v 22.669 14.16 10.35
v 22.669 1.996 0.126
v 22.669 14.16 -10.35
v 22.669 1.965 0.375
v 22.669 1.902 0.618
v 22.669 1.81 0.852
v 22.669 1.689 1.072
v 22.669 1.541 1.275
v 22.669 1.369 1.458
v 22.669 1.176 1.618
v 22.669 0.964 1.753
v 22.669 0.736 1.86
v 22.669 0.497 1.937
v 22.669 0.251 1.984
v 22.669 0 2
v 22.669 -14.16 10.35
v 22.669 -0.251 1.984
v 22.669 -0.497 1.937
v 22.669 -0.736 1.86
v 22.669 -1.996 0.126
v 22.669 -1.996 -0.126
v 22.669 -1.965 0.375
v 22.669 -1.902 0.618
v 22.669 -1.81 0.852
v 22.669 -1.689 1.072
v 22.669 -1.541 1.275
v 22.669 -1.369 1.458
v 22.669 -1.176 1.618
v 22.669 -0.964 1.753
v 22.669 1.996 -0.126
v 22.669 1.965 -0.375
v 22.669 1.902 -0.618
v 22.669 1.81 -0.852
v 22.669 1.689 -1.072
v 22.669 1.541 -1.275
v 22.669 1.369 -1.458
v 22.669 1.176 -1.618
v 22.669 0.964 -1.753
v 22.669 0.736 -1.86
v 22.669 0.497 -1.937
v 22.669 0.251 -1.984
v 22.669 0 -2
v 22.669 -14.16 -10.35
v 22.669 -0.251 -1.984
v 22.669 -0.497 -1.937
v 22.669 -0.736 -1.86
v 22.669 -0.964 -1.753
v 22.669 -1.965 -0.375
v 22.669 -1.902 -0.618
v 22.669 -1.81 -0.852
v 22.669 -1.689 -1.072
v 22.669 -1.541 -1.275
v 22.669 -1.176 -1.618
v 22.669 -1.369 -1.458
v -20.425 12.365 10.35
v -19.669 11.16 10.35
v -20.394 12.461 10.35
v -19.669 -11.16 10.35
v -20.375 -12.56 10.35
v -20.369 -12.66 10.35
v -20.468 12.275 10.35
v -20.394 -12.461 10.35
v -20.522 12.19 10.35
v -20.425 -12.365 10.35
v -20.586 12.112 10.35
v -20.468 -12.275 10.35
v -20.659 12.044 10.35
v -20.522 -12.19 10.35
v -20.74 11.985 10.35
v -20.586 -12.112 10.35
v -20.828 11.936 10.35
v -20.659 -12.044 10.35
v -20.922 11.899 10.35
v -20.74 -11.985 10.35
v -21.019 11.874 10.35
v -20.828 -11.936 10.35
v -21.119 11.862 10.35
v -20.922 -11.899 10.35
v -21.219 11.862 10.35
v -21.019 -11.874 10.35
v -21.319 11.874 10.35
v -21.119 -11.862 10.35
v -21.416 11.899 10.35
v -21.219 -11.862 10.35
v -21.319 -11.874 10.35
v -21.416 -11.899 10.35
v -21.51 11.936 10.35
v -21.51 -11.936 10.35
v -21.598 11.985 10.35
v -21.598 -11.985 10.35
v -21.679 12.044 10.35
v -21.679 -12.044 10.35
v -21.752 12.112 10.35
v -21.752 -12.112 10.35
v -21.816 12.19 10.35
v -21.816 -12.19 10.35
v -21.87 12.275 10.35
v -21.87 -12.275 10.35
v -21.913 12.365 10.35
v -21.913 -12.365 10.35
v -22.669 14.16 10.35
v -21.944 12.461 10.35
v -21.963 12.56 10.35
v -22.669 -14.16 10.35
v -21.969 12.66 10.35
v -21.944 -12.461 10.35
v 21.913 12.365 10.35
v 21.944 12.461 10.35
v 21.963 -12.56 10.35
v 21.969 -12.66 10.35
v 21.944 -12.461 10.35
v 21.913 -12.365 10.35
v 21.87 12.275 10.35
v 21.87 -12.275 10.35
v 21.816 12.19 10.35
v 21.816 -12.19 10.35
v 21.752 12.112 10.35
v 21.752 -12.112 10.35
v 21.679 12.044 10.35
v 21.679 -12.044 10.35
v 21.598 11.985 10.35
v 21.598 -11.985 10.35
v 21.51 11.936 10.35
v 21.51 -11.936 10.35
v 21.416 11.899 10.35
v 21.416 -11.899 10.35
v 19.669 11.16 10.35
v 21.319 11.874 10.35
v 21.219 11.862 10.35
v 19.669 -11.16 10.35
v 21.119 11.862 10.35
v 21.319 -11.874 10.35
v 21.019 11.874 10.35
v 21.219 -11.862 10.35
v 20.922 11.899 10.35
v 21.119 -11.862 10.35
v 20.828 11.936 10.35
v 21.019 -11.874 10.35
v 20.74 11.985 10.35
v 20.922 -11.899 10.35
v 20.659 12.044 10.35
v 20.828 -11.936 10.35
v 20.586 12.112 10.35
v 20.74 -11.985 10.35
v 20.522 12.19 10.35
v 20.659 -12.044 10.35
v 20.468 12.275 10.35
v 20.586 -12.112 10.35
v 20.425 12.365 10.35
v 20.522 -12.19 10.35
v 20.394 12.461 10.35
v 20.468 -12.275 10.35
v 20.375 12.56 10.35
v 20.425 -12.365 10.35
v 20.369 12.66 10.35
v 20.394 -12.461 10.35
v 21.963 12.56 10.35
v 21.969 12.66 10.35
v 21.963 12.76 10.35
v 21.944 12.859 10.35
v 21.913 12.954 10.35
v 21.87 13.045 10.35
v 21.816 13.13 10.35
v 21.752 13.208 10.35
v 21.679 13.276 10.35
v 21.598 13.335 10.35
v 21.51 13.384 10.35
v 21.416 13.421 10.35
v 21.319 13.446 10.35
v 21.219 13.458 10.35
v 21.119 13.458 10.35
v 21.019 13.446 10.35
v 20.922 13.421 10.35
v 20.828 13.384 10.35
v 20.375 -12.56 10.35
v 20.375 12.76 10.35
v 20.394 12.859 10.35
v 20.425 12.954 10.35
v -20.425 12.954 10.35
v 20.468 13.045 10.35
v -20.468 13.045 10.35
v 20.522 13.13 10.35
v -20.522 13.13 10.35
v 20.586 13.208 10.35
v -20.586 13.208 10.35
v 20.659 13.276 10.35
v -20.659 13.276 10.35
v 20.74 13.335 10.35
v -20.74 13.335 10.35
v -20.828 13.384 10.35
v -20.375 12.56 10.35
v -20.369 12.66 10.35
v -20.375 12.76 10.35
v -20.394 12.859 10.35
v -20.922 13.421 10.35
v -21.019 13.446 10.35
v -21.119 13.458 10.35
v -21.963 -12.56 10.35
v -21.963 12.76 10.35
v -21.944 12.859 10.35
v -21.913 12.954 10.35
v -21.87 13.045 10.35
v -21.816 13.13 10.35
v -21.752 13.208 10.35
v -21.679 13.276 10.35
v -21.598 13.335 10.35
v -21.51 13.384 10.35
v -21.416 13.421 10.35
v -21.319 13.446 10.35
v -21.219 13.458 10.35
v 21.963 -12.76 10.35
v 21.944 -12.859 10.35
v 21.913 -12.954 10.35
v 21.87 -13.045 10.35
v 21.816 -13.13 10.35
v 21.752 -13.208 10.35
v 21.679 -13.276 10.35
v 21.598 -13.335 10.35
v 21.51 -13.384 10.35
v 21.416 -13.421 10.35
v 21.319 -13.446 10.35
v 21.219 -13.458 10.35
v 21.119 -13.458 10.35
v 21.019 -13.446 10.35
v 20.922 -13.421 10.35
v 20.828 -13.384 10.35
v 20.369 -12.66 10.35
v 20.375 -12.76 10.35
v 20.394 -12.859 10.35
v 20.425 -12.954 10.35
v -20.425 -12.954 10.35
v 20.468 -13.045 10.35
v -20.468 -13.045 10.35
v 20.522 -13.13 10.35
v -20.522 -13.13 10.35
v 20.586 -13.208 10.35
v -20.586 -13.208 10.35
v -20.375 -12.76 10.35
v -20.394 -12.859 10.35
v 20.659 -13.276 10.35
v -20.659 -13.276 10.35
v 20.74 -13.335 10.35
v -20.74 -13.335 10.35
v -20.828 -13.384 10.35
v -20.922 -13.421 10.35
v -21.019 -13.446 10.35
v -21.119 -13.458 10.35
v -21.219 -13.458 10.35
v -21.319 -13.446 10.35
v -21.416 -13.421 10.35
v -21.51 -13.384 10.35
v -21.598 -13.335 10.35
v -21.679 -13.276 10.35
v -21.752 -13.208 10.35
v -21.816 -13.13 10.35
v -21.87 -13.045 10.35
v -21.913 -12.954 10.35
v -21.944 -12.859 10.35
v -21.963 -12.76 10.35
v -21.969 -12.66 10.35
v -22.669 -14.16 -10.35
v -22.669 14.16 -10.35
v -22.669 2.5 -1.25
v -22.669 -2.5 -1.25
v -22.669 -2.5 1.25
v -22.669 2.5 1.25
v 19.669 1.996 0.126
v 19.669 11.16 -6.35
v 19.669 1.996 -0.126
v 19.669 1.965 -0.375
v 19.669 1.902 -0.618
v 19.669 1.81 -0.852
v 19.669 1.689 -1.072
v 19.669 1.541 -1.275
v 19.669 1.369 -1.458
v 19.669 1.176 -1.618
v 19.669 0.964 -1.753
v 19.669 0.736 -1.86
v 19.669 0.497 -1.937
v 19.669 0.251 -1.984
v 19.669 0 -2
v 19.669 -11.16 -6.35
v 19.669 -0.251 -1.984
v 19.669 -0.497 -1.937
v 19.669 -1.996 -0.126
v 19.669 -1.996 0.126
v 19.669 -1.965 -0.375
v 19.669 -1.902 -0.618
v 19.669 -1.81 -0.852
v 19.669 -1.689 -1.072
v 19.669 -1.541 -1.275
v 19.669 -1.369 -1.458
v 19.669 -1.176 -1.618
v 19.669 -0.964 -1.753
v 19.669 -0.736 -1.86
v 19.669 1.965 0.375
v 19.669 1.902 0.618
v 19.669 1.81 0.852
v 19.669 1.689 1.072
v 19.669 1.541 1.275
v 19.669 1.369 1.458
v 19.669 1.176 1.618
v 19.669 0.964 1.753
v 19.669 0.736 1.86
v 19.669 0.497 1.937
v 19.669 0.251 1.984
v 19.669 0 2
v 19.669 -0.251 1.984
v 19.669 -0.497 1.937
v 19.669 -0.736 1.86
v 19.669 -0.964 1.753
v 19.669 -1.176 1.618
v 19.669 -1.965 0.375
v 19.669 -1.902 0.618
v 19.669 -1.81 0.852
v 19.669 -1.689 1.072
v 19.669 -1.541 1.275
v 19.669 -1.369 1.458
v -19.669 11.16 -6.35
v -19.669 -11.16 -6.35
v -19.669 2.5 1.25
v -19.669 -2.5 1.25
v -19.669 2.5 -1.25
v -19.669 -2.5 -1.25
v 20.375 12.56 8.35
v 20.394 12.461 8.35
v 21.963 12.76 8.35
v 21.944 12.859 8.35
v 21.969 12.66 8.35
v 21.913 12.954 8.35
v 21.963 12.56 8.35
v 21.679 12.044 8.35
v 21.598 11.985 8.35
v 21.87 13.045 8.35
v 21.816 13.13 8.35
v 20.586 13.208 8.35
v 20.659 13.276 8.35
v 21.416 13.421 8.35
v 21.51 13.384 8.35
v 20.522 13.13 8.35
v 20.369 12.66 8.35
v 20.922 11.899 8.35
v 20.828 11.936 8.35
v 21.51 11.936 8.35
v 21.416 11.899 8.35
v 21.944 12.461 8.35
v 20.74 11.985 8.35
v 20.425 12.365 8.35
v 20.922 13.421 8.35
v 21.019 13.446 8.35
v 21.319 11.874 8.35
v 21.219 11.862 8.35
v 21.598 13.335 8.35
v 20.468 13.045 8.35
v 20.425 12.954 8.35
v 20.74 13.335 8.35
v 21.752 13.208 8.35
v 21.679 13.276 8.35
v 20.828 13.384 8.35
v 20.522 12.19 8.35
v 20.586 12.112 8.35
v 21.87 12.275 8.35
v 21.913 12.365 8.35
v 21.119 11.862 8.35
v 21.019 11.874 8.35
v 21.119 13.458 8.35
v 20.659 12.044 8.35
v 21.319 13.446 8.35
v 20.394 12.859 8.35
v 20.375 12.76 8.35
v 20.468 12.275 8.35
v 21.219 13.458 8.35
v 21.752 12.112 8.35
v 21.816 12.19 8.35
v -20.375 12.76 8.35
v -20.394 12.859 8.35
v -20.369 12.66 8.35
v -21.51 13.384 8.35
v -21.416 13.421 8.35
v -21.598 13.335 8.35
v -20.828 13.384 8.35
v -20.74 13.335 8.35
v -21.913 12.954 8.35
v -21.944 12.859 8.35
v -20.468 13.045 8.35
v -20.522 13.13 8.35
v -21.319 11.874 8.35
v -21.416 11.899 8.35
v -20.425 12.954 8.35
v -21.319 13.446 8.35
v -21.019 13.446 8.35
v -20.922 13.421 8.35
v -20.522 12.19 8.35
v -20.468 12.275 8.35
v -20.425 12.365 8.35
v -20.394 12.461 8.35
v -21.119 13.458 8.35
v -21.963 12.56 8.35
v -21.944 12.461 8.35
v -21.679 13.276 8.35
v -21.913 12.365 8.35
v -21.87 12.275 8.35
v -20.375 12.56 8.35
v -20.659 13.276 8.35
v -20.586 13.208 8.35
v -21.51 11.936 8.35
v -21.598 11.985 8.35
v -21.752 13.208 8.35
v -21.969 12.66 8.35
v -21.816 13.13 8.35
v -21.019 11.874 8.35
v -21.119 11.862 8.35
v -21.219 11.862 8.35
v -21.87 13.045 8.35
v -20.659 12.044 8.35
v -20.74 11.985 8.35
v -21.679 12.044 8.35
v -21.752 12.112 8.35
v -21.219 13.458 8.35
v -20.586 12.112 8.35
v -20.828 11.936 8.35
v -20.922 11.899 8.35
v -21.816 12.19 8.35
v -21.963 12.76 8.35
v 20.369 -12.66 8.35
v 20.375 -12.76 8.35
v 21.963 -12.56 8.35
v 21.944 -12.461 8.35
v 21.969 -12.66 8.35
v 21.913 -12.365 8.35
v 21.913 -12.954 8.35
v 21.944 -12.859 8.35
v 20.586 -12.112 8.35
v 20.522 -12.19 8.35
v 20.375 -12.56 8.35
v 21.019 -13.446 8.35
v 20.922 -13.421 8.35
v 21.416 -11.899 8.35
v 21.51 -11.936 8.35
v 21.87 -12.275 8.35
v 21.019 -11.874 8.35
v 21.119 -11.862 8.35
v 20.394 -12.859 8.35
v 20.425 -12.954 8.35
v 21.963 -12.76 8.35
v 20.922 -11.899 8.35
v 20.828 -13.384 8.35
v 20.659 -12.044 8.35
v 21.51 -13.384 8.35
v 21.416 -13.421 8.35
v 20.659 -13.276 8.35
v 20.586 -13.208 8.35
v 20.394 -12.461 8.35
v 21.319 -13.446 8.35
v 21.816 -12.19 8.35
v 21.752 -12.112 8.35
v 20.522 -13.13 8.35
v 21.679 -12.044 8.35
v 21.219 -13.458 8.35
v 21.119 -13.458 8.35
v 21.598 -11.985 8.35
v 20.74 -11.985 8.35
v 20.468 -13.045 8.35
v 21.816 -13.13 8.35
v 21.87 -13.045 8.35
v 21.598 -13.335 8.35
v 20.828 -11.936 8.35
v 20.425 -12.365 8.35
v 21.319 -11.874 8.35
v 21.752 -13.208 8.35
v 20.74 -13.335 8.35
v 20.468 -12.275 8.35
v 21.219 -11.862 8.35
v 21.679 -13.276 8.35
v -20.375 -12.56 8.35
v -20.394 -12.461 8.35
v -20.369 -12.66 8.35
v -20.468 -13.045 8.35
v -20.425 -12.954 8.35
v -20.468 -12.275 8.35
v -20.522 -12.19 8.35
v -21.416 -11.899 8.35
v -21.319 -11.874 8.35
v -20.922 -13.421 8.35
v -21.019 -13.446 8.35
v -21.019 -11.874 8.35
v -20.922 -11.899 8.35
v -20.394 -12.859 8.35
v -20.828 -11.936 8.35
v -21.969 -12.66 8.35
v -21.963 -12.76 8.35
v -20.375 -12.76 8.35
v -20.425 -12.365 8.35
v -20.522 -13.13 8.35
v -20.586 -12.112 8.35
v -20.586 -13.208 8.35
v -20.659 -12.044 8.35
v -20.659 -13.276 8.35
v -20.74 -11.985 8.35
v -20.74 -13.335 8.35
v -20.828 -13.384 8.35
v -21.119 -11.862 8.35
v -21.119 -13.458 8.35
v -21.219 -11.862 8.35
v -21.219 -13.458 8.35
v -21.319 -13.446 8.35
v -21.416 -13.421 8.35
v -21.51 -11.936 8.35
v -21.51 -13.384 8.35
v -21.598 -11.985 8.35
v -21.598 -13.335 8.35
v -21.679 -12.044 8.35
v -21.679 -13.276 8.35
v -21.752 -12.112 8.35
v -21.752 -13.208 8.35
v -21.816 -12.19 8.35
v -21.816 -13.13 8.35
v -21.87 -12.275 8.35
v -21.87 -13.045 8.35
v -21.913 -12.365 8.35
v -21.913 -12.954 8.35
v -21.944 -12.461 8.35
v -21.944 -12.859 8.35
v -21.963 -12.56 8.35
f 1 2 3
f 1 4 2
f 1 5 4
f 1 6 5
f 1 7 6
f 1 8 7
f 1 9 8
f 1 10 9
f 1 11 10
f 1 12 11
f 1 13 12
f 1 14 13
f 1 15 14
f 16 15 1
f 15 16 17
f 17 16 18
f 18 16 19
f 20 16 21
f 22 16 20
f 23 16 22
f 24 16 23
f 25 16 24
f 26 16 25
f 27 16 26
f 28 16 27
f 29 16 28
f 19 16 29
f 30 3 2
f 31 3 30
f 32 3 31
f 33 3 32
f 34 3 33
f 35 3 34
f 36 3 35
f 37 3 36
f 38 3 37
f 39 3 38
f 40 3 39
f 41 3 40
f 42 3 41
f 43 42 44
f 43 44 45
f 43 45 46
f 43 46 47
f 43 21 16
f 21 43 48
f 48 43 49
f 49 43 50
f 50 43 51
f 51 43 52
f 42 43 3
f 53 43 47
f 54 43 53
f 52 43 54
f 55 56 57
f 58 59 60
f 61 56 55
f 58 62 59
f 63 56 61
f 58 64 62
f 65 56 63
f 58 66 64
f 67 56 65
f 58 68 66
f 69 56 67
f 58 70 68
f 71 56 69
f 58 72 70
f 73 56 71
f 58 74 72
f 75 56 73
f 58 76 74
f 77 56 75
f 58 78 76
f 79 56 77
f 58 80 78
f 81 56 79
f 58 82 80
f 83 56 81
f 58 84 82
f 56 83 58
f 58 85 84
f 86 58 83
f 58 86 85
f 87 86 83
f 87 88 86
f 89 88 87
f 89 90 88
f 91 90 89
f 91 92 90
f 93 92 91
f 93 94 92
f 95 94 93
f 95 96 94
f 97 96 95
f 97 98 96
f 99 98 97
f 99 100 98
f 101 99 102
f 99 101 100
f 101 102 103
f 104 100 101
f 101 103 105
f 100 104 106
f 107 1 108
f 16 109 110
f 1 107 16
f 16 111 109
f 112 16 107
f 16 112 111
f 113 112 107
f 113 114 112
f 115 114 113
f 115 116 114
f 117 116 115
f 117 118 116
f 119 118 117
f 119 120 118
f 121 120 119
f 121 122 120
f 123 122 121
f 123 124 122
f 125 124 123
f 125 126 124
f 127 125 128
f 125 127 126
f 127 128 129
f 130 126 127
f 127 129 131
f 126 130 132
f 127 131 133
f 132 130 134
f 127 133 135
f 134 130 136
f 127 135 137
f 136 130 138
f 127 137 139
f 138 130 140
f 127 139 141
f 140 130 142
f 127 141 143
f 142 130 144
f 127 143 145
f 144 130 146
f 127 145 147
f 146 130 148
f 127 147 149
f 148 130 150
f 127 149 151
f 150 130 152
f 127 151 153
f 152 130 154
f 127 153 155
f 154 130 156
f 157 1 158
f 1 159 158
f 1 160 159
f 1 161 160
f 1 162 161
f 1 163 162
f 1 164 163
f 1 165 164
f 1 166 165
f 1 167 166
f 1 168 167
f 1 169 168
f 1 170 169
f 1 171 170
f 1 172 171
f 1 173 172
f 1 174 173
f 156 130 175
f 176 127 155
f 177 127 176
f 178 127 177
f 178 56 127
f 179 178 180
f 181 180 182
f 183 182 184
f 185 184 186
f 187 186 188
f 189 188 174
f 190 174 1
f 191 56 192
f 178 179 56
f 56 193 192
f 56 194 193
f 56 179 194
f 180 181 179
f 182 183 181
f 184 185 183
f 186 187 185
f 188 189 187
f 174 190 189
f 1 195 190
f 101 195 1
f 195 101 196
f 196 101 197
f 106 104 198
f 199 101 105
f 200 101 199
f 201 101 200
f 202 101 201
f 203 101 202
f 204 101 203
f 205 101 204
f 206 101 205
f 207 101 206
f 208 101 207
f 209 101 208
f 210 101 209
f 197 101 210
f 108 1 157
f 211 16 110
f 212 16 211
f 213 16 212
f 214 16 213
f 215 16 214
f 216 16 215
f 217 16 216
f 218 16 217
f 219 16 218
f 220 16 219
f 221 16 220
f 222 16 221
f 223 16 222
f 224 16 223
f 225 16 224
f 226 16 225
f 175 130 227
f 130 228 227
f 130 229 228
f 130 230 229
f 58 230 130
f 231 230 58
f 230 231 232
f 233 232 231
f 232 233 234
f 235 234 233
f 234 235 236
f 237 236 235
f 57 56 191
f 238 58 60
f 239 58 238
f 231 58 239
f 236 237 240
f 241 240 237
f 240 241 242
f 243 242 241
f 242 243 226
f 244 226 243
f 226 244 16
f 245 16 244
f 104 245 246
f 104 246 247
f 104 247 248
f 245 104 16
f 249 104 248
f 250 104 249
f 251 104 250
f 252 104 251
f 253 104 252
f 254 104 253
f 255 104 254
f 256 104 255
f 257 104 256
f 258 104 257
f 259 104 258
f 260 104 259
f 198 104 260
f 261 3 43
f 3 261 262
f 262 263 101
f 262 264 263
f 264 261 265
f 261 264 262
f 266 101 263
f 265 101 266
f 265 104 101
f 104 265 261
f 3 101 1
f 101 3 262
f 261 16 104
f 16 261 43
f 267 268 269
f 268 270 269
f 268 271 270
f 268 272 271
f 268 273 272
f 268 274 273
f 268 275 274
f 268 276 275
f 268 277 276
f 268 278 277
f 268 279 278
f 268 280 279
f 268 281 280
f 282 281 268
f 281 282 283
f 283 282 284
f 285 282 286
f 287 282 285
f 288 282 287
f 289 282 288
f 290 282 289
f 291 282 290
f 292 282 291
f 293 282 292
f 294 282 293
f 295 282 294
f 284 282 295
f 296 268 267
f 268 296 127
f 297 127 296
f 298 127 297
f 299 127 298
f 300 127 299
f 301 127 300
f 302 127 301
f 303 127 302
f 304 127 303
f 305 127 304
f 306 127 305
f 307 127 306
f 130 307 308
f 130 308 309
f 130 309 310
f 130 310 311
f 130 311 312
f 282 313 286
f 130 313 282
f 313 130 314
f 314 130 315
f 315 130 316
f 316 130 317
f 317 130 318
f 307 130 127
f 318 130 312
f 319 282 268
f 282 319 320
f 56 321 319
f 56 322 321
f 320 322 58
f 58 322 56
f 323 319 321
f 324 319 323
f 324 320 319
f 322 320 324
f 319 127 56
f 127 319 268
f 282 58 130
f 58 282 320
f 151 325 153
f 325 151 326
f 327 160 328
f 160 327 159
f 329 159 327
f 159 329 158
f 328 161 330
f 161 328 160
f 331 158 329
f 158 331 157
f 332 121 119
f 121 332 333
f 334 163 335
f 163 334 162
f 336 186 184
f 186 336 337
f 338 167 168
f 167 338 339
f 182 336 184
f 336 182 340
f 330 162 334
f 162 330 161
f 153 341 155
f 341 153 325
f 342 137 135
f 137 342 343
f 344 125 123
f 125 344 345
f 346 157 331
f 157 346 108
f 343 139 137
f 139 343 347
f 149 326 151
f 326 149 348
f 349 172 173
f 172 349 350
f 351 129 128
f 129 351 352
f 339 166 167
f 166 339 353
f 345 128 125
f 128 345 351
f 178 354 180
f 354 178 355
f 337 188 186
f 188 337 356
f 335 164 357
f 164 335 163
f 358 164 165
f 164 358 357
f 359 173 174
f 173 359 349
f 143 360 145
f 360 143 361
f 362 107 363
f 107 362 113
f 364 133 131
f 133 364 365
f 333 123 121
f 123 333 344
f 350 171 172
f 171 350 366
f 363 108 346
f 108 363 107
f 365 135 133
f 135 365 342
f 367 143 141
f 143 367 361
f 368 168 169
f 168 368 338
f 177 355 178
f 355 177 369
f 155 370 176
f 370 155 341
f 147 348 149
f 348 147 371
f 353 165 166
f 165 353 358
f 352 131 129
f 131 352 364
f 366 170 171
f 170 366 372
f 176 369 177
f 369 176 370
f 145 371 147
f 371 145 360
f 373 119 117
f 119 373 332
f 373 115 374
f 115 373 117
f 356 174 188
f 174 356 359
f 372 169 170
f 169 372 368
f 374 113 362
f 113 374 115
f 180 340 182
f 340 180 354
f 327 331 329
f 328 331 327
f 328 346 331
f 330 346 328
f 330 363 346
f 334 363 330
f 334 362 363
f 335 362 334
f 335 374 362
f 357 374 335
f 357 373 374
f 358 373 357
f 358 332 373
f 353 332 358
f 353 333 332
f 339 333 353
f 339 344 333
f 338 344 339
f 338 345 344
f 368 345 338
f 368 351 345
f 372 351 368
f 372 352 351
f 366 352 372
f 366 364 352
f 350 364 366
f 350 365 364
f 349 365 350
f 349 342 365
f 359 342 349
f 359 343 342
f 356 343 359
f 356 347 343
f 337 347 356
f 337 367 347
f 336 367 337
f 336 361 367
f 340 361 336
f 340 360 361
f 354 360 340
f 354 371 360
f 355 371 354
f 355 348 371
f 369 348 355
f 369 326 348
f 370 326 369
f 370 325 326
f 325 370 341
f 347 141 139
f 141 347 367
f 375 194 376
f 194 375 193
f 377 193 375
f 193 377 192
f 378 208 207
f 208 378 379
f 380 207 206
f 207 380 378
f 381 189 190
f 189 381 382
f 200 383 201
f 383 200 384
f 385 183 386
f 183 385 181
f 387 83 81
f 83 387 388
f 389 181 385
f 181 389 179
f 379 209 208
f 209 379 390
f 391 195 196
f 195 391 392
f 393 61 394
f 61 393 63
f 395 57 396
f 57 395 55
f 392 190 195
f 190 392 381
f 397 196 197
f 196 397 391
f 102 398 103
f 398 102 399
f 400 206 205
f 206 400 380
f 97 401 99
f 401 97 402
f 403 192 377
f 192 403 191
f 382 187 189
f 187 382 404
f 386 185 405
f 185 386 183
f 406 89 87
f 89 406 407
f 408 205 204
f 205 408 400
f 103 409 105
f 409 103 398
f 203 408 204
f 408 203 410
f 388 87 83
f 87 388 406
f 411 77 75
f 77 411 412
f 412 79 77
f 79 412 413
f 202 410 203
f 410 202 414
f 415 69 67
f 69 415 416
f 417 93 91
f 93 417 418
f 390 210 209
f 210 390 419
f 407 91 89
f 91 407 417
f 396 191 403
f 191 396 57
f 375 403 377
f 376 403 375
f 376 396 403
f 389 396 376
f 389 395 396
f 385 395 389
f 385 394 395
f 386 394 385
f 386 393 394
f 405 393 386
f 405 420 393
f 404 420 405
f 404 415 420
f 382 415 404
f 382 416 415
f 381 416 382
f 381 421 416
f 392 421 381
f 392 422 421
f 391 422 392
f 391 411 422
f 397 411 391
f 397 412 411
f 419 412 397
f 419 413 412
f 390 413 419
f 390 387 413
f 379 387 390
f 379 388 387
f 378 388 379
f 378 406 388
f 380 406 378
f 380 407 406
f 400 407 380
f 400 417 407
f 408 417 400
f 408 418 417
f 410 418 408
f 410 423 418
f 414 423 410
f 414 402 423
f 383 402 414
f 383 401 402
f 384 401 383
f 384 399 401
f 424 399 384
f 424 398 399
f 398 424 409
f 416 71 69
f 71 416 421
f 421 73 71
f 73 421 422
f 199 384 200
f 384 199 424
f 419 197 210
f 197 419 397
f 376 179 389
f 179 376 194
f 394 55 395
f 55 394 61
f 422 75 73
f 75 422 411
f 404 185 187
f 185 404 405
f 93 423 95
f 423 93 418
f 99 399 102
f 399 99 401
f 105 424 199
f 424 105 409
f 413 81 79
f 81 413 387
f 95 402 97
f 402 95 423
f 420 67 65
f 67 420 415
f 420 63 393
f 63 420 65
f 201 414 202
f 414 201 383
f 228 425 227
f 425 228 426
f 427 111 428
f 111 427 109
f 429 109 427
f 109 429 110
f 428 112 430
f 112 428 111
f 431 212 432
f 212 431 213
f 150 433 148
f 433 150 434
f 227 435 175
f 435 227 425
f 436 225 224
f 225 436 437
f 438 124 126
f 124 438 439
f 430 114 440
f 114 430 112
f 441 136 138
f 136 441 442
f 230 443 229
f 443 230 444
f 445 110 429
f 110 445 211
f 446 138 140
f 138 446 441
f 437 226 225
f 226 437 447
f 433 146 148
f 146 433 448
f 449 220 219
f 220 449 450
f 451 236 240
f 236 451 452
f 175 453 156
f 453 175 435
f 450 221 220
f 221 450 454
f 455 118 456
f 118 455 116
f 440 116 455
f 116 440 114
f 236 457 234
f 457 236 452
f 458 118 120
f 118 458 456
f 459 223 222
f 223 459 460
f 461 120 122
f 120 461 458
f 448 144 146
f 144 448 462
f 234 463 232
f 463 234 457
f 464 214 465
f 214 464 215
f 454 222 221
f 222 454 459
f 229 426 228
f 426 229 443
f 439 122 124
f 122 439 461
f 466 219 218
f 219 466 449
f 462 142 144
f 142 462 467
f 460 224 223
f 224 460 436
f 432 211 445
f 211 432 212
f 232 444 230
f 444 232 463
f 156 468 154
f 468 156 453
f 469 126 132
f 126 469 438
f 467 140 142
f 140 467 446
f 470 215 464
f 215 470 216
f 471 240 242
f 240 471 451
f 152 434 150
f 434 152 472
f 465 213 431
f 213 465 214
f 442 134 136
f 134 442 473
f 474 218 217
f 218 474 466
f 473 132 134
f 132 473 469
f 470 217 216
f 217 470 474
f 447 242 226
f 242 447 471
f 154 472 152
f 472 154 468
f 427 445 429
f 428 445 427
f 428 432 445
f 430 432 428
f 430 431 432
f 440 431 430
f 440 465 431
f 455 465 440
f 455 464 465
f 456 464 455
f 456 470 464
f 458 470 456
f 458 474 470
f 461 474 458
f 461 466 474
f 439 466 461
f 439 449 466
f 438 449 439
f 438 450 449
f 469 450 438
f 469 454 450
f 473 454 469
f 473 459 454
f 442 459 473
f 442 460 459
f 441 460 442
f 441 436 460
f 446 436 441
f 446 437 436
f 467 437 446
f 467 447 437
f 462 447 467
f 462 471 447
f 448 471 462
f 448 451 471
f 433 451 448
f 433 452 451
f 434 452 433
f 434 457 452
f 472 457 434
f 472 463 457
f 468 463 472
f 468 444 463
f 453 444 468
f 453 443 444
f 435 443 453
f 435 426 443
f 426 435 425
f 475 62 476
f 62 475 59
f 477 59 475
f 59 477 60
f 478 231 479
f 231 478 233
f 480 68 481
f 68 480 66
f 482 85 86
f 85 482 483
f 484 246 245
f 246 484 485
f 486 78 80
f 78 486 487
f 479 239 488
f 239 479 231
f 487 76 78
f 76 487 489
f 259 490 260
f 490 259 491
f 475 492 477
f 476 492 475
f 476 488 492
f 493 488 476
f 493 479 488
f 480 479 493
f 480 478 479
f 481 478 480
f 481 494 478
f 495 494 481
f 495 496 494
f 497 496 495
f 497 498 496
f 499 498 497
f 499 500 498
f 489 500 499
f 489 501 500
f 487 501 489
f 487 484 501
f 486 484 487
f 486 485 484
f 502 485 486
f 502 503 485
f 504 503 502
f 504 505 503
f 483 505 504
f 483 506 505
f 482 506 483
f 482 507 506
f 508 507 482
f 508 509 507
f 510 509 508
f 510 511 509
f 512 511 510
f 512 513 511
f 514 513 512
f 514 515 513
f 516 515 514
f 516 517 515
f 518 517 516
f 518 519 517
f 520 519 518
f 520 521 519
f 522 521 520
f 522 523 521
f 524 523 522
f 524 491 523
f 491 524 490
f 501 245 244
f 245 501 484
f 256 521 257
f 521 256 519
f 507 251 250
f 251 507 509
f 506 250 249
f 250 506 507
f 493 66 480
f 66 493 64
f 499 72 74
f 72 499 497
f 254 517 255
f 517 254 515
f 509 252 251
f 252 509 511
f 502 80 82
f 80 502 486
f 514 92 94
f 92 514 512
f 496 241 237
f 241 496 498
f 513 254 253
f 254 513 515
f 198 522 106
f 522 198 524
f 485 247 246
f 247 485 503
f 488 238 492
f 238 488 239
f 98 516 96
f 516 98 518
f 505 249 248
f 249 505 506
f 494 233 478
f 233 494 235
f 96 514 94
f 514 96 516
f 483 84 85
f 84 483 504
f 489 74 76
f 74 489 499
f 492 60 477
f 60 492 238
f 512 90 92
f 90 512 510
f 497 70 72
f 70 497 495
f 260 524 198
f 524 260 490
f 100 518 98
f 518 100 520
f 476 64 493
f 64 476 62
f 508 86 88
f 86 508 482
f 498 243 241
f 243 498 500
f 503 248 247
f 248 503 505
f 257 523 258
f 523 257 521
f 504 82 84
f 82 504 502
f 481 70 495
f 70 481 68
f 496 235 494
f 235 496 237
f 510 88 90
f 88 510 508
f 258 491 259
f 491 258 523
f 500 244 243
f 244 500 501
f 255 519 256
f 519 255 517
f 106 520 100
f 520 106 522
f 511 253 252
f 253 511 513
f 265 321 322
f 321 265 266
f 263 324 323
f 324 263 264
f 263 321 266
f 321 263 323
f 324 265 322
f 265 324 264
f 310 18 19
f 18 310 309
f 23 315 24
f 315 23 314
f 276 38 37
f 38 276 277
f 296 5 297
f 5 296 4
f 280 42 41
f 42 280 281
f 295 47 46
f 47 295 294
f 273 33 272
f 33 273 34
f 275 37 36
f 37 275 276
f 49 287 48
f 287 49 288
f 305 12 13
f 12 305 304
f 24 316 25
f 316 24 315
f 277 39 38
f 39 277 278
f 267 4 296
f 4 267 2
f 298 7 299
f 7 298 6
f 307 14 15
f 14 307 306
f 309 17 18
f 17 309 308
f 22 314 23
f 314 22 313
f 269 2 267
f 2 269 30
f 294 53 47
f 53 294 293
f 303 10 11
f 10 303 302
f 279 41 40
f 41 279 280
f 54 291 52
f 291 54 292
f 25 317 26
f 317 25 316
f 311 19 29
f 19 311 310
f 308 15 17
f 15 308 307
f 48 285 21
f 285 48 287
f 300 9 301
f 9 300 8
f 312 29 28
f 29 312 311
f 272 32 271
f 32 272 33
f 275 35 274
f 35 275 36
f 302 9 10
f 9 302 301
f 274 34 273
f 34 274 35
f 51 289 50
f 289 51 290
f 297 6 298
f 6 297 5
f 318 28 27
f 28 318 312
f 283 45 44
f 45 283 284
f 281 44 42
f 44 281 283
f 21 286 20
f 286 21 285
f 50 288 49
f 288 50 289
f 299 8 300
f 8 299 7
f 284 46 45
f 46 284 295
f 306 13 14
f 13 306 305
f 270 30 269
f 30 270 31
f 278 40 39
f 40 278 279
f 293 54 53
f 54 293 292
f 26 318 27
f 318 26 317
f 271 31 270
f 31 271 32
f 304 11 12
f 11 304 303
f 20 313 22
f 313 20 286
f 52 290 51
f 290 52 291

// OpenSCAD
$fn = 50;

module enclosure() {

  // Defined properties.

  spark_length = 37.338;
  spark_width  = 20.32;
  spark_height = 12.7;

  wall_size  = 3;
  padding    = 1;
  peg_height  = 2;
  peg_radius = 0.8;

  wire_radius = 2;

  micro_usb_width  = 5;
  micro_usb_height = 2.5;

  // Computed properties.

  inside_length  = spark_length + (padding * 2);
  outside_length = inside_length + (wall_size * 2);
  inside_width   = spark_width + (padding * 2);
  outside_width  = inside_width + (wall_size * 2);
  inside_height  = spark_height + (padding * 2);
  outside_height = inside_height + (wall_size * 2);

  // Useful properties.
  overflow_size = 1;

  difference() {
  	// Outer box.
    cube([outside_length, outside_width, outside_height], center=true);

  	// Inner box.
    translate([0, 0, padding + wall_size]) {
      cube([inside_length, inside_width, outside_height], center=true);
    }

  	// Pegs.
    translate([((outside_length / 2) - (wall_size / 2)), ((outside_width / 2) - (wall_size / 2)), (outside_height / 2) - peg_height ]) {
      cylinder(h=peg_height, r=peg_radius);
    }
    translate([-((outside_length / 2) - (wall_size / 2)), ((outside_width / 2) - (wall_size / 2)), (outside_height / 2) - peg_height ]) {
      cylinder(h=peg_height, r=peg_radius);
    }
    translate([((outside_length / 2) - (wall_size / 2)), -((outside_width / 2) - (wall_size / 2)), (outside_height / 2) - peg_height ]) {
      cylinder(h=peg_height, r=peg_radius);
    }
    translate([-((outside_length / 2) - (wall_size / 2)), -((outside_width / 2) - (wall_size / 2)), (outside_height / 2) - peg_height ]) {
      cylinder(h=peg_height, r=peg_radius);
    }

    // Micro USB.
    translate([-((inside_length / 2) + (wall_size / 2)), 0, 0]) {
      cube([wall_size + overflow_size, micro_usb_width, micro_usb_height], center=true);
    }

    // Wire port.
    translate([((inside_length / 2) + (wall_size / 2)), 0, 0]) {
      rotate([0, 90, 0]) {
        cylinder(wall_size + overflow_size, r=wire_radius, center=true);
      }
    }
  }
}

enclosure();
